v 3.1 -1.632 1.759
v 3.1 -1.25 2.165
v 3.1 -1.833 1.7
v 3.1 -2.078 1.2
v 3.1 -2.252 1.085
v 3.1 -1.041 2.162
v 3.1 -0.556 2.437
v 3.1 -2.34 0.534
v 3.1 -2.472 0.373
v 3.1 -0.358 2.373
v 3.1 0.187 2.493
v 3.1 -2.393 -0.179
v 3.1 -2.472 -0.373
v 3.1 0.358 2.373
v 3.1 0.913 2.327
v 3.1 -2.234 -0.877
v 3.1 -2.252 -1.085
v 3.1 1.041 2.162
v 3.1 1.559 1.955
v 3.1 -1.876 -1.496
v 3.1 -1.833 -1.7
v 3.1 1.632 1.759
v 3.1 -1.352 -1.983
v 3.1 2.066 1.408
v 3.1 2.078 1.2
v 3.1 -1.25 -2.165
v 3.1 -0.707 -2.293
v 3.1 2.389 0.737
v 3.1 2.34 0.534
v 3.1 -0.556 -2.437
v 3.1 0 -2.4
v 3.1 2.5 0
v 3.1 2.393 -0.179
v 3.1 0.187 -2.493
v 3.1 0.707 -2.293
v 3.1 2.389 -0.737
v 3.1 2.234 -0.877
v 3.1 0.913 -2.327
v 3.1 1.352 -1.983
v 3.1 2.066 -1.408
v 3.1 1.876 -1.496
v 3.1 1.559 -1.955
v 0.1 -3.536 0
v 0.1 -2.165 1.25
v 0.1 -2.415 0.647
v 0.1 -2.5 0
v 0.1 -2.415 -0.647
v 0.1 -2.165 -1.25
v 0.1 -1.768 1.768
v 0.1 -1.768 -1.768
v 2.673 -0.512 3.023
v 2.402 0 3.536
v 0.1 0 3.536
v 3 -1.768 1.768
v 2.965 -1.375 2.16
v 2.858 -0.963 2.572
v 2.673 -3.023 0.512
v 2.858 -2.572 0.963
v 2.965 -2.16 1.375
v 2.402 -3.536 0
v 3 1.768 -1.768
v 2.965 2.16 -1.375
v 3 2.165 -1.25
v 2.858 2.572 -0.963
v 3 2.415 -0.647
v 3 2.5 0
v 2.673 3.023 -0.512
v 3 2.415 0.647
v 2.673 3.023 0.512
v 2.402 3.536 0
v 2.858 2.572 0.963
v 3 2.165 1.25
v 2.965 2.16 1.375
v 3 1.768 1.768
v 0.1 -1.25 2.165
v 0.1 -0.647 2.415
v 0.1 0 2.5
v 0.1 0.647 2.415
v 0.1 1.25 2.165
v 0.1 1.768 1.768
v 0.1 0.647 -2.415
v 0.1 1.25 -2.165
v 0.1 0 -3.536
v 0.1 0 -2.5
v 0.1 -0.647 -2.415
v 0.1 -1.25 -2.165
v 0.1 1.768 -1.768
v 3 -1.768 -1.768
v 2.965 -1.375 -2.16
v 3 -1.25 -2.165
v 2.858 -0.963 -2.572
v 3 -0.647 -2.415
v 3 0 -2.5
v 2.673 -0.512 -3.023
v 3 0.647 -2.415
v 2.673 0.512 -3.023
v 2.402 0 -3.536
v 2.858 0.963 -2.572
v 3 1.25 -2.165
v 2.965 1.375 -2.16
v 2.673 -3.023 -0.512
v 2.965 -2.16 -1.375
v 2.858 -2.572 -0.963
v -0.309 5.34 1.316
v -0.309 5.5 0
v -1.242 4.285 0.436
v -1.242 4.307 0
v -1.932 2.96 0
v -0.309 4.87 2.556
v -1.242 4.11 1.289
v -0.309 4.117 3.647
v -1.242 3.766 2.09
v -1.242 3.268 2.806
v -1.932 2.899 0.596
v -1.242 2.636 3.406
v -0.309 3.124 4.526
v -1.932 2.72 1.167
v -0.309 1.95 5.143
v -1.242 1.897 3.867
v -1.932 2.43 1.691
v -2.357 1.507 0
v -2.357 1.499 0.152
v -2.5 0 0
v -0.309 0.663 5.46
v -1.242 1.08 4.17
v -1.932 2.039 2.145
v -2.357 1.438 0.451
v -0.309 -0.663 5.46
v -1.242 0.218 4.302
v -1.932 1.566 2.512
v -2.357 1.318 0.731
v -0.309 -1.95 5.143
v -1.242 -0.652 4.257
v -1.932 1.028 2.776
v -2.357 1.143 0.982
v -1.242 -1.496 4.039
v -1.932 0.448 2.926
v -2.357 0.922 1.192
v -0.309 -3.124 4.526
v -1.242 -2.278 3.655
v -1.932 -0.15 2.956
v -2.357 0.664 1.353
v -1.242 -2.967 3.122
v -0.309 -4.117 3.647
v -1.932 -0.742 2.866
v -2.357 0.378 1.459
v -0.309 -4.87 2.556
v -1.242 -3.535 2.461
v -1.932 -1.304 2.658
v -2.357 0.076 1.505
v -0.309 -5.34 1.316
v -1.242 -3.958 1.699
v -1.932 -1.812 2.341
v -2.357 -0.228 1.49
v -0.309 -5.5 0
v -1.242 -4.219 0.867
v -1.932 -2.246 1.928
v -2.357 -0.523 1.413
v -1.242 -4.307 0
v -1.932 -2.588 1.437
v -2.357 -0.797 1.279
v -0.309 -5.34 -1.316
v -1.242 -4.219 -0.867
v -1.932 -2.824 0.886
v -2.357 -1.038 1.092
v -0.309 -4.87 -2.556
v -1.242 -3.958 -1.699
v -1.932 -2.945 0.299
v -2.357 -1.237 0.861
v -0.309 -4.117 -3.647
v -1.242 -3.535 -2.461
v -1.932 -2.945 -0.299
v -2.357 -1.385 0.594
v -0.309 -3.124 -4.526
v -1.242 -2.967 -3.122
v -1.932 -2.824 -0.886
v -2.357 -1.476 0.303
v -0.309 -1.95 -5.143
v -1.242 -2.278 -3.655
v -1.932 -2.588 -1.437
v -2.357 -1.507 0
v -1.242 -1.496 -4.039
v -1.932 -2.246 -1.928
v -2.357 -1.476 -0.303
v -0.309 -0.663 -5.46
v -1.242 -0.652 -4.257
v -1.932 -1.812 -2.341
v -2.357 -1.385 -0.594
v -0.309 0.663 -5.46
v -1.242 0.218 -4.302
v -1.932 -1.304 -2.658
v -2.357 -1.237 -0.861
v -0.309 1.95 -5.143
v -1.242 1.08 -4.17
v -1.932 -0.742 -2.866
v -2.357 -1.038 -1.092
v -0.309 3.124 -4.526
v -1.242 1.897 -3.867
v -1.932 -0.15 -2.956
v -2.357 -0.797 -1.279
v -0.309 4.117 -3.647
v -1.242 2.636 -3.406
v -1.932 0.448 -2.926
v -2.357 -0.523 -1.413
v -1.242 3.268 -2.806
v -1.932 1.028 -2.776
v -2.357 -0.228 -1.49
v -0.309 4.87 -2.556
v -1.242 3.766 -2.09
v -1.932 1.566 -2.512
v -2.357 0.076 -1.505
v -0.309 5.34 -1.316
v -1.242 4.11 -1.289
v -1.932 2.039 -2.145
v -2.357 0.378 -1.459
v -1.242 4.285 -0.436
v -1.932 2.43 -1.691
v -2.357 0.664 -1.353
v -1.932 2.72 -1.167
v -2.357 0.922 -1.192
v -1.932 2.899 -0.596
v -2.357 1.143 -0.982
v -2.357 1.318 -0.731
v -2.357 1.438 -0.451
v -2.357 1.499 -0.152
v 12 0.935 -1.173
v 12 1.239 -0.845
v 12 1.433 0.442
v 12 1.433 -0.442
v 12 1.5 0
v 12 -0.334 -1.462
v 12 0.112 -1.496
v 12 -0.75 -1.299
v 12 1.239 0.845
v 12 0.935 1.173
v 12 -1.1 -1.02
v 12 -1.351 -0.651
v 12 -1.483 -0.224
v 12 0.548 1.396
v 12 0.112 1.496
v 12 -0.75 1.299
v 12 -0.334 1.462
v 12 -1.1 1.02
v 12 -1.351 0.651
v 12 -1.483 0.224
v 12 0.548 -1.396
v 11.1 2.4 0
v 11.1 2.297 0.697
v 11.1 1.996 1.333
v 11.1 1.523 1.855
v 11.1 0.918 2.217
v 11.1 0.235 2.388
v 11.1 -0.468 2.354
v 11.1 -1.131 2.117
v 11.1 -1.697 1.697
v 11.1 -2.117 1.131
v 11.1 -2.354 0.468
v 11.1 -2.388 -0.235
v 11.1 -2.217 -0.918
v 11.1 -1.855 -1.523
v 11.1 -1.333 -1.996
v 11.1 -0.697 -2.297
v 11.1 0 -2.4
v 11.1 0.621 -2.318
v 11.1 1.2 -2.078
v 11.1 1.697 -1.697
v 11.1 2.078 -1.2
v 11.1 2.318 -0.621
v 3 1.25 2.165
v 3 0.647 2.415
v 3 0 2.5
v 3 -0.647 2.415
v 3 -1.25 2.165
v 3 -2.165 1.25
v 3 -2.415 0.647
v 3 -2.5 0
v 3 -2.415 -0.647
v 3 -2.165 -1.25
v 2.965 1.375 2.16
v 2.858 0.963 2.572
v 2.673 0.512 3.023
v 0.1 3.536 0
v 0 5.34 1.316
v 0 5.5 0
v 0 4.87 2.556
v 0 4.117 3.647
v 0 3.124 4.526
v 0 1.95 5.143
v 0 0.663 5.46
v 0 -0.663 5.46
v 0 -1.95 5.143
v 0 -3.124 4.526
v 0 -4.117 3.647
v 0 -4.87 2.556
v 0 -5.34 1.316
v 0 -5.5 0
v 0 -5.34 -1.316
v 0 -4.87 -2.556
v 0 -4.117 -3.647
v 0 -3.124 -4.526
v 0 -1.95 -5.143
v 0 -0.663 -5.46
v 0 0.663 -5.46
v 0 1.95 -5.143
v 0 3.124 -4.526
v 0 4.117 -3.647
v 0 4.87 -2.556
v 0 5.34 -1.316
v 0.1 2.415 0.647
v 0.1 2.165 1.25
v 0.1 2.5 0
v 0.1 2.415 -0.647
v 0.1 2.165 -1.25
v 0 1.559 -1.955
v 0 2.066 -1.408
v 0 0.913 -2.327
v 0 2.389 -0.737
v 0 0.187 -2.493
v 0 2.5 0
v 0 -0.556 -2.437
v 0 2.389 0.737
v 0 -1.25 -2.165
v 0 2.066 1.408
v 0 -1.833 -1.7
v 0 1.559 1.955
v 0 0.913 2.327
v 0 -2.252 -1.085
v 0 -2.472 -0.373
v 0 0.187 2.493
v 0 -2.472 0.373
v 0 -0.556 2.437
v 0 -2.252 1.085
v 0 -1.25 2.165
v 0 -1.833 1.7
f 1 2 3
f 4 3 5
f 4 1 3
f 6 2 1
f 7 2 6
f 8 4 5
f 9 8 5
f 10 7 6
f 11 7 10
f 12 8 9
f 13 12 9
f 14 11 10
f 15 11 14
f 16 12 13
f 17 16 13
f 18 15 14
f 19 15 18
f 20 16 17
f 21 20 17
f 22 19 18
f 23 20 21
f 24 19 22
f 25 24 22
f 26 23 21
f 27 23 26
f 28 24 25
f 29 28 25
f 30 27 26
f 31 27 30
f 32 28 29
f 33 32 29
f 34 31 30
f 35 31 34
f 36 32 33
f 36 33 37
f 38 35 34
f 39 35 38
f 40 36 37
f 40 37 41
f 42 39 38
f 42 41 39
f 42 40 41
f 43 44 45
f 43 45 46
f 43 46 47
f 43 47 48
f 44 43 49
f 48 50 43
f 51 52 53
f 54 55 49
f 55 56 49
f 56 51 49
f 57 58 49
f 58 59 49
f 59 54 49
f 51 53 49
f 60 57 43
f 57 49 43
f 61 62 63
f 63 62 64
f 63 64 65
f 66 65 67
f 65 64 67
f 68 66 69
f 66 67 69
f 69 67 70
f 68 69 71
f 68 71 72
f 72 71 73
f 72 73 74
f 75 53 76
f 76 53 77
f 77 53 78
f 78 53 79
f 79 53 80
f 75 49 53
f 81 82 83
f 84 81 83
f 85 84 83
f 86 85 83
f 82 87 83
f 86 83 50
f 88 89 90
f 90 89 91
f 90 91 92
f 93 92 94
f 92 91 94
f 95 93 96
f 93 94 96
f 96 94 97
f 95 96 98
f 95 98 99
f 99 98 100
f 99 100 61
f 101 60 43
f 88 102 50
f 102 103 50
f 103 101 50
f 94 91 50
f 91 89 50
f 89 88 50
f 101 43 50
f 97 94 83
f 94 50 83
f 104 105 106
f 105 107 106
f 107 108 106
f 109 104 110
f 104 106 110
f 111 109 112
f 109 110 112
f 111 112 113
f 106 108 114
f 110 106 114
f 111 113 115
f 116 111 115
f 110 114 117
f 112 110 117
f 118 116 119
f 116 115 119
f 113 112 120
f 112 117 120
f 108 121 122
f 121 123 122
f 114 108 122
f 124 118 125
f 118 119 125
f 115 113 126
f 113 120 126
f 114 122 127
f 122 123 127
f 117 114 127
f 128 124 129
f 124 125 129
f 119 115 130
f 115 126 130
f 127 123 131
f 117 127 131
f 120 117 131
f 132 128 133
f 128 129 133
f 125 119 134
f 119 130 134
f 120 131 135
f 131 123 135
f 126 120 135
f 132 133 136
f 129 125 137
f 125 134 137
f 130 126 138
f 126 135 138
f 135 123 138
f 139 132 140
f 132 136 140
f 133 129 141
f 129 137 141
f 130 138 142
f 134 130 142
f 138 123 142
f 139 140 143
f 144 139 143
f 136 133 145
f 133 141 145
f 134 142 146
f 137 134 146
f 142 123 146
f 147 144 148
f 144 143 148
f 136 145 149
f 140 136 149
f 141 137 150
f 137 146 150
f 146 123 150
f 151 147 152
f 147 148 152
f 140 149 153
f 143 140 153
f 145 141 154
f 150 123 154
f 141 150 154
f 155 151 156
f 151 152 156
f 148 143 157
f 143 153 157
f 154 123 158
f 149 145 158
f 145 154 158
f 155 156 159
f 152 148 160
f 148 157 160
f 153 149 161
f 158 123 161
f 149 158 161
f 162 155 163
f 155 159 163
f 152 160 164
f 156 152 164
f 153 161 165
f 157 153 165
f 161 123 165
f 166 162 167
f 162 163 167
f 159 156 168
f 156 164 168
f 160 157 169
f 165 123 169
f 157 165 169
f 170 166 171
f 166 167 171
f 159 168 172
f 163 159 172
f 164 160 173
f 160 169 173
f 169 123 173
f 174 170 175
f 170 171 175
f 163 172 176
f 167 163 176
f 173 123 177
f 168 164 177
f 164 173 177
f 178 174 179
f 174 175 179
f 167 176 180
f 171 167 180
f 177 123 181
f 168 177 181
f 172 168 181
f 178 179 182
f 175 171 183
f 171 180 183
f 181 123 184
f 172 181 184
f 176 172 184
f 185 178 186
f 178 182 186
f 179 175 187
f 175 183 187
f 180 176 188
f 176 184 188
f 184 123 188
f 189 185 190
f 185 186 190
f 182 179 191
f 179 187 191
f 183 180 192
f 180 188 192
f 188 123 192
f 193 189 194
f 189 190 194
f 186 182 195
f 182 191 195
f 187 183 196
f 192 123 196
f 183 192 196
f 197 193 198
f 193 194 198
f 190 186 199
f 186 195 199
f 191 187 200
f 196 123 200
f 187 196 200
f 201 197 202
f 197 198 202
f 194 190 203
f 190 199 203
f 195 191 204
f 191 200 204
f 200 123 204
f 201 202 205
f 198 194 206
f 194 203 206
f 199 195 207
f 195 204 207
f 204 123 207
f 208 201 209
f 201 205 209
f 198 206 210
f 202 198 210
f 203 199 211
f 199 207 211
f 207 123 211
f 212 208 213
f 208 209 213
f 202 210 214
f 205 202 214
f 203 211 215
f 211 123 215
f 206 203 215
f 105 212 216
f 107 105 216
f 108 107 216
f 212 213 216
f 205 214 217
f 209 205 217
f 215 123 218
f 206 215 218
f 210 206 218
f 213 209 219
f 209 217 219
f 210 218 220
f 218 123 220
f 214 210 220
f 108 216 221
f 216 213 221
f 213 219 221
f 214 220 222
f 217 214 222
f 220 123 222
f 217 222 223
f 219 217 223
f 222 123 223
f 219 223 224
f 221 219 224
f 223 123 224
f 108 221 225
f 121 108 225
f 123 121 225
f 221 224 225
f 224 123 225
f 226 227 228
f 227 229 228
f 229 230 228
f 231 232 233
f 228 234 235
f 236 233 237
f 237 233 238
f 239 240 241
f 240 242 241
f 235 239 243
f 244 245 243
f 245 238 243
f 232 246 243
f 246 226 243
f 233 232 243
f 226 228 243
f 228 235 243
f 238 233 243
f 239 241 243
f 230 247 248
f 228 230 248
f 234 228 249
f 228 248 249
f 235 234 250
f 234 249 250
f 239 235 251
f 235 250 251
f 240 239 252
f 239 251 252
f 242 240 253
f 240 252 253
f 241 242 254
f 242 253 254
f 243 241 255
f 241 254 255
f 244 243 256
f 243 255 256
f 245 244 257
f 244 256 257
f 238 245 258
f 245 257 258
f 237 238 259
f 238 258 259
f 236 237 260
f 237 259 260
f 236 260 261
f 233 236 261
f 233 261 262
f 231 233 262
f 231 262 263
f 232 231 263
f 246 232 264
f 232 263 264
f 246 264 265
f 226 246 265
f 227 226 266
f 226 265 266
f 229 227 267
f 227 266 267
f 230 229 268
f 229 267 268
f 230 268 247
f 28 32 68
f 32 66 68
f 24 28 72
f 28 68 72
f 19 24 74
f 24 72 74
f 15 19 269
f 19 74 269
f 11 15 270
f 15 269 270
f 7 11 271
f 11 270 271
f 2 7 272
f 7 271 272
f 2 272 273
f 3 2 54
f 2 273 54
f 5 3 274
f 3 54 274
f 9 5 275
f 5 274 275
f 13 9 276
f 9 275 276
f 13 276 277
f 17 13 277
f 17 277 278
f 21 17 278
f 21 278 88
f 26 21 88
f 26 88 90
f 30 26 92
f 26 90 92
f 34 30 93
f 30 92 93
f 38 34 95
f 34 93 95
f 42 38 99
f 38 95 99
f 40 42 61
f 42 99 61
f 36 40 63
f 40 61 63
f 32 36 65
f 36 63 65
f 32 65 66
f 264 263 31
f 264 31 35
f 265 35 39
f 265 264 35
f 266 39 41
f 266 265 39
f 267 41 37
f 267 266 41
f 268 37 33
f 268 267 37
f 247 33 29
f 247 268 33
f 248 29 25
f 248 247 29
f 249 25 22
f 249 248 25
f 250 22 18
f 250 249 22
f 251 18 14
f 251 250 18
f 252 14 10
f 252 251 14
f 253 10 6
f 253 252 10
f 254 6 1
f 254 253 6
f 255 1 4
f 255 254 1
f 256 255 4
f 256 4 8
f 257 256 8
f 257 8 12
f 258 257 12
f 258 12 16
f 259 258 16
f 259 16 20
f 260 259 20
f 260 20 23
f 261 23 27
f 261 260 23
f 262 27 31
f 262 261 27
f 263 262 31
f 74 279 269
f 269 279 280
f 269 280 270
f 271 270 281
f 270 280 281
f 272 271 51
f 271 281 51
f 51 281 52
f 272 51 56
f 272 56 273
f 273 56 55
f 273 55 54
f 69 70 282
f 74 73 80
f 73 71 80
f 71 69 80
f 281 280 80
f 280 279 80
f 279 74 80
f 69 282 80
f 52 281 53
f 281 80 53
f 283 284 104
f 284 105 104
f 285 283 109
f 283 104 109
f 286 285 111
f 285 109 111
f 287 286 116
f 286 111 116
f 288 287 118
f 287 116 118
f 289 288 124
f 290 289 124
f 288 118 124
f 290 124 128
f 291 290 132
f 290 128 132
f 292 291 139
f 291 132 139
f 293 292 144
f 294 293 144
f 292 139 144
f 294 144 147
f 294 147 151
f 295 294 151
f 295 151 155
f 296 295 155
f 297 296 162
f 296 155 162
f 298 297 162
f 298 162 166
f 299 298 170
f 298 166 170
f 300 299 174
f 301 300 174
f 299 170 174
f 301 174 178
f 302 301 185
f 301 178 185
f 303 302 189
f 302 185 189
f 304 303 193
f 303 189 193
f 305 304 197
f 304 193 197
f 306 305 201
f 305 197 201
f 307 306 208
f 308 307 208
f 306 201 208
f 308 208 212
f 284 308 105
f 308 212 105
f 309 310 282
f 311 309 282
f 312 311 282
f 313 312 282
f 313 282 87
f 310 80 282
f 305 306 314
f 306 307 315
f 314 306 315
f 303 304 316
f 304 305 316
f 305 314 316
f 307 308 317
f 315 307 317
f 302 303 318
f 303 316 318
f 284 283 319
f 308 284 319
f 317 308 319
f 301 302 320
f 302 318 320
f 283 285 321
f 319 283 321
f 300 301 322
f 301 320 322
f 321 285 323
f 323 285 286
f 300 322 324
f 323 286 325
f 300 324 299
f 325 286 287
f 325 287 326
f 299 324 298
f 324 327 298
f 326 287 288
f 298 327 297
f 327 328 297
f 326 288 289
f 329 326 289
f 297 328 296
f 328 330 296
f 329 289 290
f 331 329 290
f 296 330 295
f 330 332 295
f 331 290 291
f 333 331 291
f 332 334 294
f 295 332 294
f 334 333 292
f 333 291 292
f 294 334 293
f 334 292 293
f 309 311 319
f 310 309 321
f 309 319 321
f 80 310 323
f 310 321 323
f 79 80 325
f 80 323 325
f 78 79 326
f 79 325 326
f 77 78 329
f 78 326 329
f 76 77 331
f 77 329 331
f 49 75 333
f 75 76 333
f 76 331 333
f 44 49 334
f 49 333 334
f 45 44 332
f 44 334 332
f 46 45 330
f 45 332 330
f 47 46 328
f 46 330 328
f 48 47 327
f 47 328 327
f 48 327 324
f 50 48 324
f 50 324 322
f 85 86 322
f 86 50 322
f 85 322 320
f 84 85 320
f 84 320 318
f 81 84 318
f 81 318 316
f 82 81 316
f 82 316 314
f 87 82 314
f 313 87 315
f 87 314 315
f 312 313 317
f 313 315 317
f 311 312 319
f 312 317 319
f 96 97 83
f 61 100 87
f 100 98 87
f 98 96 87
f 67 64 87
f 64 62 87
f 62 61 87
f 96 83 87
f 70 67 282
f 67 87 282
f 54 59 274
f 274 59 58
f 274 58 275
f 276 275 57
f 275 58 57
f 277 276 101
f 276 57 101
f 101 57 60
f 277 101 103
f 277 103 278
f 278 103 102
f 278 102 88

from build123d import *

# Parameters (mm, degrees)
EXTRUDE_START       = 0.1
EXTRUDE_1_DEPTH     = 2.9
SKETCH_6_R          = 2.5
SKETCH_6_R_2        = 2.4
CUT_EXTRUDE_1_DEPTH = 8.9


with BuildPart() as part:
    # Эскиз3 → Повернуть1 (revolve)
    with BuildSketch(Plane.XY):
        with BuildLine():
            Line((12, 0), (12, 1.5))
            Line((12, 1.5), (11, 2.5))
            Line((11, 2.5), (0, 2.5))
            Line((0, 2.5), (0, 5.5))
            Line((0, 5.5), (-0.309475019, 5.5))
            ThreePointArc((-0.309475019, 5.5), (-1.9322204, 2.960084445), (-2.5, 0))
            Line((-2.5, 0), (12, 0))
        make_face()
    revolve(axis=Axis((-123.766149148, 0, 0), (1, 0, 0)))

    # Эскиз4 → Бобышка-Вытянуть1 (add)
    with BuildSketch(Plane(origin=(0, 0, 0), x_dir=(0, 0, -1), z_dir=(1, 0, 0)).offset(EXTRUDE_START)):
        Polygon((0, 3.535533906), (-3.535533906, 0), (0, -3.535533906), (3.535533906, 0), align=None)
    extrude(amount=EXTRUDE_1_DEPTH)


with BuildPart() as body_2:
    # Эскиз5 → Повернуть2 (revolve)
    with BuildSketch(Plane.XY):
        Polygon((3, 2.5), (2.402134221, 3.535533906), (3, 3.535533906), align=None)
    revolve(axis=Axis((-123.766149148, 0, 0), (1, 0, 0)))


with BuildPart() as part_1:
    add(part.part)

    # Combine 1: cut body 2
    add(body_2.part, mode=Mode.SUBTRACT)

    # Эскиз6 → Вырез-Вытянуть1 (cut)
    with BuildSketch(Plane(origin=(12, 0, 0), x_dir=(0, 0, -1), z_dir=(1, 0, 0))):
        Circle(SKETCH_6_R)
        Circle(SKETCH_6_R_2, mode=Mode.SUBTRACT)
    extrude(amount=-CUT_EXTRUDE_1_DEPTH, mode=Mode.SUBTRACT)


solid = part_1.part
